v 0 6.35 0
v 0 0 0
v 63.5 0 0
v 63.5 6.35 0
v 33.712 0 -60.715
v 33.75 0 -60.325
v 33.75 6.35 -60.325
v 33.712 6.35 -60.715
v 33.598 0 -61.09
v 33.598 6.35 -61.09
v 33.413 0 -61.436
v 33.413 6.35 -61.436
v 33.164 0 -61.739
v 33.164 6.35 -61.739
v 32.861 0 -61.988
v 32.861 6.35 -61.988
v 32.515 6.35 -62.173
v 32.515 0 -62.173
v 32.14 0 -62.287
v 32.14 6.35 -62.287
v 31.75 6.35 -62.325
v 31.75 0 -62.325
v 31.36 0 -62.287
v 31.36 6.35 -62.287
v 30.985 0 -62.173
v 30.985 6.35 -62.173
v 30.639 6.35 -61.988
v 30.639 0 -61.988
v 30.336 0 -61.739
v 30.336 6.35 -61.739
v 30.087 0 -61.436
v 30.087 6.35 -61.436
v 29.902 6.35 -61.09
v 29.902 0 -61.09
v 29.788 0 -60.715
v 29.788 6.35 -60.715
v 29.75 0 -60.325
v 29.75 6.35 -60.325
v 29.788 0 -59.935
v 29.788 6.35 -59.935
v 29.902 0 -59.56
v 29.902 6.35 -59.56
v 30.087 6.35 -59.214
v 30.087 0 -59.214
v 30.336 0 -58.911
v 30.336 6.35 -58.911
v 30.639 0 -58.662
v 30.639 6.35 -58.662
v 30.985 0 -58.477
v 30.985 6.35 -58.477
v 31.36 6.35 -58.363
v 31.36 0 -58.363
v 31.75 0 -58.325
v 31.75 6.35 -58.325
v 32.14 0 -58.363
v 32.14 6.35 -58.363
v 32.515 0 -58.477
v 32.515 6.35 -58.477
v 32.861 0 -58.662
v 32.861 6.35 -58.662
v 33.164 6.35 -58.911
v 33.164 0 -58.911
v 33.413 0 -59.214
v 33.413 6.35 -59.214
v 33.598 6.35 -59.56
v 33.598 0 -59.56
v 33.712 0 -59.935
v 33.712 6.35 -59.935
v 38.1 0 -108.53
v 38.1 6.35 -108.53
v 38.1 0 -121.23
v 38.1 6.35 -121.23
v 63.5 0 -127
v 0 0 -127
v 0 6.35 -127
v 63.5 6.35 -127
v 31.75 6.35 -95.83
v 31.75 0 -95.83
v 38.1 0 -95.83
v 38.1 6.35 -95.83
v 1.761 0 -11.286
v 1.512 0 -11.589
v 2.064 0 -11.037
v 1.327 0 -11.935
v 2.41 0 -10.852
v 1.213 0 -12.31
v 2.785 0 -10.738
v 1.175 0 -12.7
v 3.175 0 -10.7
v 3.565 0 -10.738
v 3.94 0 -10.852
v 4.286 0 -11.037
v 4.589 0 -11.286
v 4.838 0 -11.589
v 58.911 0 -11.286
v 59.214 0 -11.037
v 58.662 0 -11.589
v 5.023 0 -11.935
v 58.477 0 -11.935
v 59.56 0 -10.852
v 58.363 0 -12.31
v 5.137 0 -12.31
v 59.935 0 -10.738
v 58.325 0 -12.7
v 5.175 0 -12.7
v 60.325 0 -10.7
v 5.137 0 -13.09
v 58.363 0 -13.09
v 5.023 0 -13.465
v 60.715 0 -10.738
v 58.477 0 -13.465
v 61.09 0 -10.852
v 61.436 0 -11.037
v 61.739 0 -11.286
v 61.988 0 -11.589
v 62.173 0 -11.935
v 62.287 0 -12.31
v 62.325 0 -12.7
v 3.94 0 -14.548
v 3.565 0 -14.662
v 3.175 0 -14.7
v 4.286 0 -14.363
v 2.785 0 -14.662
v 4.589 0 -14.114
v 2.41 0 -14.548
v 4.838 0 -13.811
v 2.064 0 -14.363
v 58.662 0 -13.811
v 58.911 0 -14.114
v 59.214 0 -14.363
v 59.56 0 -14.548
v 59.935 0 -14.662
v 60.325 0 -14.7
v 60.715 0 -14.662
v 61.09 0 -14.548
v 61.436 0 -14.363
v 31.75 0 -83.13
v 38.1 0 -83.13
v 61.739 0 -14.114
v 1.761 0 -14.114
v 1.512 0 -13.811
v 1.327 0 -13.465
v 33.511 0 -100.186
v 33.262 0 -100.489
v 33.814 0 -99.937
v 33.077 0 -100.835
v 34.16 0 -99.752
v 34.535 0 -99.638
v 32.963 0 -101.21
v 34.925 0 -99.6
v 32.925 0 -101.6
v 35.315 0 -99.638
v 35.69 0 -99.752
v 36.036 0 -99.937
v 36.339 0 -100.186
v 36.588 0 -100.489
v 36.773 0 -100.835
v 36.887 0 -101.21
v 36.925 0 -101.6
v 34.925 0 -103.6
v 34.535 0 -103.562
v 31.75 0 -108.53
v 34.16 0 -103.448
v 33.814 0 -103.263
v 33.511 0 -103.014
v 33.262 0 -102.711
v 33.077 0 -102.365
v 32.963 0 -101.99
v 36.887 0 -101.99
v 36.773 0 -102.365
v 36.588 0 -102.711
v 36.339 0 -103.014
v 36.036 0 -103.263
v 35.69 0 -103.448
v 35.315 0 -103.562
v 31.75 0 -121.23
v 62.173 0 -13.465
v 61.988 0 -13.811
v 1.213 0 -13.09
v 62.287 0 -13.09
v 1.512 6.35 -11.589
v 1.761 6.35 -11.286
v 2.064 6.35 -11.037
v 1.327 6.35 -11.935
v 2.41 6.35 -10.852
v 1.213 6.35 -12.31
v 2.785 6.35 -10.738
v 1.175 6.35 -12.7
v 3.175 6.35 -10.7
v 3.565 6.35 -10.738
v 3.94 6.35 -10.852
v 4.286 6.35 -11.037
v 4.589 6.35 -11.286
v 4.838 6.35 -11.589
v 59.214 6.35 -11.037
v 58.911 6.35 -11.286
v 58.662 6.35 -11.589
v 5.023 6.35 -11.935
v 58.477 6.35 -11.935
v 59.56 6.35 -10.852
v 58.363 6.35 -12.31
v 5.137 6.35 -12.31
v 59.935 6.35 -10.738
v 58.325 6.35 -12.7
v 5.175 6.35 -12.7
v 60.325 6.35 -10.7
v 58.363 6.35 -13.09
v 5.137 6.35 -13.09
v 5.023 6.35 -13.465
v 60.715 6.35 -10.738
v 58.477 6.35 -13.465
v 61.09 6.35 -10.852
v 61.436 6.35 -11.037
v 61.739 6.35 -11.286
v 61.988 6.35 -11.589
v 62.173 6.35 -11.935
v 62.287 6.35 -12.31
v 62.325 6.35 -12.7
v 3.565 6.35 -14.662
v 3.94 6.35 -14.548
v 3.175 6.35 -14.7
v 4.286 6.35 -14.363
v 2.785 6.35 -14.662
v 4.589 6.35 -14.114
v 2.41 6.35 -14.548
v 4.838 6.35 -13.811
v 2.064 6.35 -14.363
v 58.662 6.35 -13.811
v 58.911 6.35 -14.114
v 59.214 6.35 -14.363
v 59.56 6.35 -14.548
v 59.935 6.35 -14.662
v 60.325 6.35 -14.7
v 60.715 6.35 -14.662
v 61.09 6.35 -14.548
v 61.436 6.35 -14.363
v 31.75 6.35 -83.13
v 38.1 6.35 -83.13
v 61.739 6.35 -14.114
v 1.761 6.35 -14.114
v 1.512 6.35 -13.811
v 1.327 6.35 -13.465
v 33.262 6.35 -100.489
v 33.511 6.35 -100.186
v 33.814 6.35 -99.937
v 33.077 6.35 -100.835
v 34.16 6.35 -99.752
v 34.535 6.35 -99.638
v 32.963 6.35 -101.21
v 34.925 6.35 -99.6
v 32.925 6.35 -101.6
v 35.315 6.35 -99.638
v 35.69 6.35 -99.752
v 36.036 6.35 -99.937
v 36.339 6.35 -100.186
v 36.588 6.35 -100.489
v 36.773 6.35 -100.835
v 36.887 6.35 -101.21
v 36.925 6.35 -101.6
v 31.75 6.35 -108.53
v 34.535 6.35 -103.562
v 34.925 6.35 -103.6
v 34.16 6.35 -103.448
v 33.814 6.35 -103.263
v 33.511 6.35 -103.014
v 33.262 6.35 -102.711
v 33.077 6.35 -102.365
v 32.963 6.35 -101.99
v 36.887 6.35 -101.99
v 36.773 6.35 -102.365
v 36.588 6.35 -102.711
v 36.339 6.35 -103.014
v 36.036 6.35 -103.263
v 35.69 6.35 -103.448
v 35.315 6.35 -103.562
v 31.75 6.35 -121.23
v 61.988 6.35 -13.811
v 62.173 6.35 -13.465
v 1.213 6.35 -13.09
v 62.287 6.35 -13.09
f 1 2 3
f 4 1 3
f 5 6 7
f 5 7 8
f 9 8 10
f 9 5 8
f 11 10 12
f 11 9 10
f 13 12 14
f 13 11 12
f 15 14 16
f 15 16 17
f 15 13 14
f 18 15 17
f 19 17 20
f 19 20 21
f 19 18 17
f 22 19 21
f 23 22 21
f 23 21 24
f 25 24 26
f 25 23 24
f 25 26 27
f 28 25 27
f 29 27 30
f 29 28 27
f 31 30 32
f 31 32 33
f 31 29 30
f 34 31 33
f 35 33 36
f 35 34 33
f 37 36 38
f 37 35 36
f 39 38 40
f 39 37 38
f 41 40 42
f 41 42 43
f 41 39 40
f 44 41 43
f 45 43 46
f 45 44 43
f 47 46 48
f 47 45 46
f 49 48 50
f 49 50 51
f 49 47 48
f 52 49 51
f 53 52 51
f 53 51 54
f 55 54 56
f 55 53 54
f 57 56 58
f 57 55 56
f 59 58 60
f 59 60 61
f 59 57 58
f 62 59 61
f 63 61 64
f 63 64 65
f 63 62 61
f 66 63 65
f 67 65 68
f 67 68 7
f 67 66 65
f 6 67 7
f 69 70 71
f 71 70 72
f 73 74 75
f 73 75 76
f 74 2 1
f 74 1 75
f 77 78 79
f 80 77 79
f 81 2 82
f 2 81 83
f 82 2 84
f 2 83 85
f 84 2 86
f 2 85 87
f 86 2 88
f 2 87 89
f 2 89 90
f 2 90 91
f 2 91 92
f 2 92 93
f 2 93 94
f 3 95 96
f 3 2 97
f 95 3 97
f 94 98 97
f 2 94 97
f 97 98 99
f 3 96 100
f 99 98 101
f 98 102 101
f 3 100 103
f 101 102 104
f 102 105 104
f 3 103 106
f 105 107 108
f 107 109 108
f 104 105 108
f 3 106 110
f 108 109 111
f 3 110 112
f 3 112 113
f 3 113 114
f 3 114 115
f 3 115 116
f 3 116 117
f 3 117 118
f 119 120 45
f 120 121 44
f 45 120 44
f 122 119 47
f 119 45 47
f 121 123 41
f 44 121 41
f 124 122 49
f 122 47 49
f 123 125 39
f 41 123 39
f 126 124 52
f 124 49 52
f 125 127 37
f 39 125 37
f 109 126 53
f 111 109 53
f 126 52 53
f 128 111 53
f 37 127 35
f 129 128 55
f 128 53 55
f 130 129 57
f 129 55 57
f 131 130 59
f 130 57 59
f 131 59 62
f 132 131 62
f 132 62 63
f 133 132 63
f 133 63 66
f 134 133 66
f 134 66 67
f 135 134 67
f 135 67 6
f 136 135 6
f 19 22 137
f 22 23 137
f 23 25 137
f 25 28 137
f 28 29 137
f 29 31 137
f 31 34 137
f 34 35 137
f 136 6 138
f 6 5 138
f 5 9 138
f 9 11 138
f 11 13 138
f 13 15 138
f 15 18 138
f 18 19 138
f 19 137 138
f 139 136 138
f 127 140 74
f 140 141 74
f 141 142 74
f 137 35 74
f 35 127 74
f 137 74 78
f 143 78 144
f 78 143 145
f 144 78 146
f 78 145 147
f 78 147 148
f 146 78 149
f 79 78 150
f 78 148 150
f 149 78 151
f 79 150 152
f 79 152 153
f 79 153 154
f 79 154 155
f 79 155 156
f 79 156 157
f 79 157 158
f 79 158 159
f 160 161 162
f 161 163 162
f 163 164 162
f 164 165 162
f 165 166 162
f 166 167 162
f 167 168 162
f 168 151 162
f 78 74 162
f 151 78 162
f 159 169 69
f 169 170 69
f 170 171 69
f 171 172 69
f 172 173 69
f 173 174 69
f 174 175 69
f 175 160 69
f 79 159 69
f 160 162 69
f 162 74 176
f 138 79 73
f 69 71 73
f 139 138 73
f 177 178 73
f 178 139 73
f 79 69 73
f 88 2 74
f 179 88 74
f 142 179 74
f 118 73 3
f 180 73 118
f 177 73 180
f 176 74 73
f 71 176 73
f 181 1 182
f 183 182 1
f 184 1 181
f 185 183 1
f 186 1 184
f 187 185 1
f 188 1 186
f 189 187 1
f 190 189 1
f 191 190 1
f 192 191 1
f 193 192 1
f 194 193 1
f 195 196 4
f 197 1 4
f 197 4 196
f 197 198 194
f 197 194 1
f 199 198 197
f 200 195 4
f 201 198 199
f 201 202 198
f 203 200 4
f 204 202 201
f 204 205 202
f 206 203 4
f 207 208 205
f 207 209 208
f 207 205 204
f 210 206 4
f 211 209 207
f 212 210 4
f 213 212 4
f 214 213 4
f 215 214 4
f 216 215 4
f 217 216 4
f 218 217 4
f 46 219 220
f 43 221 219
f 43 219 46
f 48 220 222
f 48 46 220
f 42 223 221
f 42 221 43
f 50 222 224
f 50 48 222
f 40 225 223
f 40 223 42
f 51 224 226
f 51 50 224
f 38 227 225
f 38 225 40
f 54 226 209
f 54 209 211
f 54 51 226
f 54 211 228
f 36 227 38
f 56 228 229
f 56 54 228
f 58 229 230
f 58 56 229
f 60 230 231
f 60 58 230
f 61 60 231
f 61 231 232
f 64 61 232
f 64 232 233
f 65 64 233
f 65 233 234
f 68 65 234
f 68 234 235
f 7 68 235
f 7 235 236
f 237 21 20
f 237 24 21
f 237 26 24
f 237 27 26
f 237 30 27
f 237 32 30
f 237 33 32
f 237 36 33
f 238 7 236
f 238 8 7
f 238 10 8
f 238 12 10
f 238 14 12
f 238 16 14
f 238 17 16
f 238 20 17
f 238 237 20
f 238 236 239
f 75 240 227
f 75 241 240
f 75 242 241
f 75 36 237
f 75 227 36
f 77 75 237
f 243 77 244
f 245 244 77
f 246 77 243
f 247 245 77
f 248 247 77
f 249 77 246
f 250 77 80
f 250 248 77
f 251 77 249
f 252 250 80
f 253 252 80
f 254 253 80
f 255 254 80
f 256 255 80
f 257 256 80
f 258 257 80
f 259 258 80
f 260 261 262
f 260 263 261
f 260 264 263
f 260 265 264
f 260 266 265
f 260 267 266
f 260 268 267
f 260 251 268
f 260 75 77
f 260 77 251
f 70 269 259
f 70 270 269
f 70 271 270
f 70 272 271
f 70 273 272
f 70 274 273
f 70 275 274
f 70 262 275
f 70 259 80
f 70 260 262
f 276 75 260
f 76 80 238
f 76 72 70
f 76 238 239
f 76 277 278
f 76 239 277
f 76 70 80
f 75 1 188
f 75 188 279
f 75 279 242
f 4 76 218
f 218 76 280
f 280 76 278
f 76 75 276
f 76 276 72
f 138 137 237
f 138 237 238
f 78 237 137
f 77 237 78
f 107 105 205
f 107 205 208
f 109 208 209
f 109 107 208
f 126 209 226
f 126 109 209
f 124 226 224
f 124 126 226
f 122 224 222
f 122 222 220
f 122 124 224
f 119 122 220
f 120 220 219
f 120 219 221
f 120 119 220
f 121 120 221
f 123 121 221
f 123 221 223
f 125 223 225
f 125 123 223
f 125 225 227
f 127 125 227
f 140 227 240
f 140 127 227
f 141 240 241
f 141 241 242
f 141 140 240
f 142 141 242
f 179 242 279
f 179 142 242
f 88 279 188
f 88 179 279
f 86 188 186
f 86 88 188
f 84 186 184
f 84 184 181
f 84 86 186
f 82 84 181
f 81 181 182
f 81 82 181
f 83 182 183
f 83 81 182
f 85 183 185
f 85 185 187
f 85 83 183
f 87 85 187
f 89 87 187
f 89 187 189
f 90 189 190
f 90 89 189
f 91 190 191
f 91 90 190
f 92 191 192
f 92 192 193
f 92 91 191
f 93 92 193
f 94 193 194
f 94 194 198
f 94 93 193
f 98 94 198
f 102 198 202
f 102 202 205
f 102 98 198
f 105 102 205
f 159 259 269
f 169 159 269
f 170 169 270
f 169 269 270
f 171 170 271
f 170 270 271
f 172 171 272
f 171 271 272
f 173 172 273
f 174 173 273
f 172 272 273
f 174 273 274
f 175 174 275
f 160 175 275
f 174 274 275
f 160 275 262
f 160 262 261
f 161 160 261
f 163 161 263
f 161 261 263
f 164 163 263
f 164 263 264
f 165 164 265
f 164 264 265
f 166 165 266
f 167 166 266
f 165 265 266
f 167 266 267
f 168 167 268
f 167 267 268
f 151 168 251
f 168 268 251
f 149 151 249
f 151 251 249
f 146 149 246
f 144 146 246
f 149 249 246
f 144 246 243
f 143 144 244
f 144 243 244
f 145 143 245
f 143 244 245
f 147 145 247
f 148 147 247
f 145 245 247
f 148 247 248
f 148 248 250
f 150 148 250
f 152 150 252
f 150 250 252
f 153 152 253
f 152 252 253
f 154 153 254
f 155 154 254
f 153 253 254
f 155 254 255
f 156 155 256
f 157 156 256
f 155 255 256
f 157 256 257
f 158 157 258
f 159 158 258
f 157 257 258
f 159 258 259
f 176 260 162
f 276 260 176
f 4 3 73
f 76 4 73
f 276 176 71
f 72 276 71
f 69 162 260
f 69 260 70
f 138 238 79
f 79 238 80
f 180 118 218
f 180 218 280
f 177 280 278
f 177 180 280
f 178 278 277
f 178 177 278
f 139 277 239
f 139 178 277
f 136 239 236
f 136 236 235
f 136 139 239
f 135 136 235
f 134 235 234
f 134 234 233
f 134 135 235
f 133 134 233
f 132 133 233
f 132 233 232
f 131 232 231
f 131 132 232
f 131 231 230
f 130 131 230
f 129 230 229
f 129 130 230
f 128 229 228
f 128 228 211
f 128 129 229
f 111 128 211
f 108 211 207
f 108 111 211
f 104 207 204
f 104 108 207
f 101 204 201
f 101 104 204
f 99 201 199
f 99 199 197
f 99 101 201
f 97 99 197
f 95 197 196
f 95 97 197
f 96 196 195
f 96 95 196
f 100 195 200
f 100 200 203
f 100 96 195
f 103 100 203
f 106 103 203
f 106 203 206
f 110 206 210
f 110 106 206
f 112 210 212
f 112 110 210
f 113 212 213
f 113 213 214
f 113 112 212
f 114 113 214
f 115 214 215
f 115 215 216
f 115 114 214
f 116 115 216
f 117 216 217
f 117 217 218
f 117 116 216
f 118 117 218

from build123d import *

# Parameters (mm, degrees)
SKETCH1_W           = 63.5
SKETCH1_H           = 127
SKETCH1_R           = 2
BOSS_EXTRUDE1_DEPTH = 6.35
SKETCH2_R           = 2
SKETCH2_W           = 6.35
SKETCH2_H           = 12.7
CUT_EXTRUDE1_DEPTH  = 6.35


with BuildPart() as part:
    # Sketch1 → Boss-Extrude1 (new body)
    with BuildSketch(Plane(origin=(0, 0, 0), x_dir=(1, 0, 0), z_dir=(0, 1, 0))):
        with Locations((31.75, 63.5)):
            Rectangle(SKETCH1_W, SKETCH1_H)
        with Locations((3.175, 12.7)):
            Circle(SKETCH1_R, mode=Mode.SUBTRACT)
        with Locations((60.325, 12.7)):
            Circle(SKETCH1_R, mode=Mode.SUBTRACT)
        with Locations((31.75, 60.325)):
            Circle(SKETCH1_R, mode=Mode.SUBTRACT)
    extrude(amount=BOSS_EXTRUDE1_DEPTH)

    # Sketch2 → Cut-Extrude1 (cut)
    with BuildSketch(Plane(origin=(0, 6.35, 0), x_dir=(1, 0, 0), z_dir=(0, 1, 0))):
        with Locations((34.925, 101.6)):
            Circle(SKETCH2_R)
        with Locations((34.925, 89.48002155)):
            Rectangle(SKETCH2_W, SKETCH2_H)
        with Locations((34.925, 114.88002155)):
            Rectangle(SKETCH2_W, SKETCH2_H)
    extrude(amount=-CUT_EXTRUDE1_DEPTH, mode=Mode.SUBTRACT)


solid = part.part
